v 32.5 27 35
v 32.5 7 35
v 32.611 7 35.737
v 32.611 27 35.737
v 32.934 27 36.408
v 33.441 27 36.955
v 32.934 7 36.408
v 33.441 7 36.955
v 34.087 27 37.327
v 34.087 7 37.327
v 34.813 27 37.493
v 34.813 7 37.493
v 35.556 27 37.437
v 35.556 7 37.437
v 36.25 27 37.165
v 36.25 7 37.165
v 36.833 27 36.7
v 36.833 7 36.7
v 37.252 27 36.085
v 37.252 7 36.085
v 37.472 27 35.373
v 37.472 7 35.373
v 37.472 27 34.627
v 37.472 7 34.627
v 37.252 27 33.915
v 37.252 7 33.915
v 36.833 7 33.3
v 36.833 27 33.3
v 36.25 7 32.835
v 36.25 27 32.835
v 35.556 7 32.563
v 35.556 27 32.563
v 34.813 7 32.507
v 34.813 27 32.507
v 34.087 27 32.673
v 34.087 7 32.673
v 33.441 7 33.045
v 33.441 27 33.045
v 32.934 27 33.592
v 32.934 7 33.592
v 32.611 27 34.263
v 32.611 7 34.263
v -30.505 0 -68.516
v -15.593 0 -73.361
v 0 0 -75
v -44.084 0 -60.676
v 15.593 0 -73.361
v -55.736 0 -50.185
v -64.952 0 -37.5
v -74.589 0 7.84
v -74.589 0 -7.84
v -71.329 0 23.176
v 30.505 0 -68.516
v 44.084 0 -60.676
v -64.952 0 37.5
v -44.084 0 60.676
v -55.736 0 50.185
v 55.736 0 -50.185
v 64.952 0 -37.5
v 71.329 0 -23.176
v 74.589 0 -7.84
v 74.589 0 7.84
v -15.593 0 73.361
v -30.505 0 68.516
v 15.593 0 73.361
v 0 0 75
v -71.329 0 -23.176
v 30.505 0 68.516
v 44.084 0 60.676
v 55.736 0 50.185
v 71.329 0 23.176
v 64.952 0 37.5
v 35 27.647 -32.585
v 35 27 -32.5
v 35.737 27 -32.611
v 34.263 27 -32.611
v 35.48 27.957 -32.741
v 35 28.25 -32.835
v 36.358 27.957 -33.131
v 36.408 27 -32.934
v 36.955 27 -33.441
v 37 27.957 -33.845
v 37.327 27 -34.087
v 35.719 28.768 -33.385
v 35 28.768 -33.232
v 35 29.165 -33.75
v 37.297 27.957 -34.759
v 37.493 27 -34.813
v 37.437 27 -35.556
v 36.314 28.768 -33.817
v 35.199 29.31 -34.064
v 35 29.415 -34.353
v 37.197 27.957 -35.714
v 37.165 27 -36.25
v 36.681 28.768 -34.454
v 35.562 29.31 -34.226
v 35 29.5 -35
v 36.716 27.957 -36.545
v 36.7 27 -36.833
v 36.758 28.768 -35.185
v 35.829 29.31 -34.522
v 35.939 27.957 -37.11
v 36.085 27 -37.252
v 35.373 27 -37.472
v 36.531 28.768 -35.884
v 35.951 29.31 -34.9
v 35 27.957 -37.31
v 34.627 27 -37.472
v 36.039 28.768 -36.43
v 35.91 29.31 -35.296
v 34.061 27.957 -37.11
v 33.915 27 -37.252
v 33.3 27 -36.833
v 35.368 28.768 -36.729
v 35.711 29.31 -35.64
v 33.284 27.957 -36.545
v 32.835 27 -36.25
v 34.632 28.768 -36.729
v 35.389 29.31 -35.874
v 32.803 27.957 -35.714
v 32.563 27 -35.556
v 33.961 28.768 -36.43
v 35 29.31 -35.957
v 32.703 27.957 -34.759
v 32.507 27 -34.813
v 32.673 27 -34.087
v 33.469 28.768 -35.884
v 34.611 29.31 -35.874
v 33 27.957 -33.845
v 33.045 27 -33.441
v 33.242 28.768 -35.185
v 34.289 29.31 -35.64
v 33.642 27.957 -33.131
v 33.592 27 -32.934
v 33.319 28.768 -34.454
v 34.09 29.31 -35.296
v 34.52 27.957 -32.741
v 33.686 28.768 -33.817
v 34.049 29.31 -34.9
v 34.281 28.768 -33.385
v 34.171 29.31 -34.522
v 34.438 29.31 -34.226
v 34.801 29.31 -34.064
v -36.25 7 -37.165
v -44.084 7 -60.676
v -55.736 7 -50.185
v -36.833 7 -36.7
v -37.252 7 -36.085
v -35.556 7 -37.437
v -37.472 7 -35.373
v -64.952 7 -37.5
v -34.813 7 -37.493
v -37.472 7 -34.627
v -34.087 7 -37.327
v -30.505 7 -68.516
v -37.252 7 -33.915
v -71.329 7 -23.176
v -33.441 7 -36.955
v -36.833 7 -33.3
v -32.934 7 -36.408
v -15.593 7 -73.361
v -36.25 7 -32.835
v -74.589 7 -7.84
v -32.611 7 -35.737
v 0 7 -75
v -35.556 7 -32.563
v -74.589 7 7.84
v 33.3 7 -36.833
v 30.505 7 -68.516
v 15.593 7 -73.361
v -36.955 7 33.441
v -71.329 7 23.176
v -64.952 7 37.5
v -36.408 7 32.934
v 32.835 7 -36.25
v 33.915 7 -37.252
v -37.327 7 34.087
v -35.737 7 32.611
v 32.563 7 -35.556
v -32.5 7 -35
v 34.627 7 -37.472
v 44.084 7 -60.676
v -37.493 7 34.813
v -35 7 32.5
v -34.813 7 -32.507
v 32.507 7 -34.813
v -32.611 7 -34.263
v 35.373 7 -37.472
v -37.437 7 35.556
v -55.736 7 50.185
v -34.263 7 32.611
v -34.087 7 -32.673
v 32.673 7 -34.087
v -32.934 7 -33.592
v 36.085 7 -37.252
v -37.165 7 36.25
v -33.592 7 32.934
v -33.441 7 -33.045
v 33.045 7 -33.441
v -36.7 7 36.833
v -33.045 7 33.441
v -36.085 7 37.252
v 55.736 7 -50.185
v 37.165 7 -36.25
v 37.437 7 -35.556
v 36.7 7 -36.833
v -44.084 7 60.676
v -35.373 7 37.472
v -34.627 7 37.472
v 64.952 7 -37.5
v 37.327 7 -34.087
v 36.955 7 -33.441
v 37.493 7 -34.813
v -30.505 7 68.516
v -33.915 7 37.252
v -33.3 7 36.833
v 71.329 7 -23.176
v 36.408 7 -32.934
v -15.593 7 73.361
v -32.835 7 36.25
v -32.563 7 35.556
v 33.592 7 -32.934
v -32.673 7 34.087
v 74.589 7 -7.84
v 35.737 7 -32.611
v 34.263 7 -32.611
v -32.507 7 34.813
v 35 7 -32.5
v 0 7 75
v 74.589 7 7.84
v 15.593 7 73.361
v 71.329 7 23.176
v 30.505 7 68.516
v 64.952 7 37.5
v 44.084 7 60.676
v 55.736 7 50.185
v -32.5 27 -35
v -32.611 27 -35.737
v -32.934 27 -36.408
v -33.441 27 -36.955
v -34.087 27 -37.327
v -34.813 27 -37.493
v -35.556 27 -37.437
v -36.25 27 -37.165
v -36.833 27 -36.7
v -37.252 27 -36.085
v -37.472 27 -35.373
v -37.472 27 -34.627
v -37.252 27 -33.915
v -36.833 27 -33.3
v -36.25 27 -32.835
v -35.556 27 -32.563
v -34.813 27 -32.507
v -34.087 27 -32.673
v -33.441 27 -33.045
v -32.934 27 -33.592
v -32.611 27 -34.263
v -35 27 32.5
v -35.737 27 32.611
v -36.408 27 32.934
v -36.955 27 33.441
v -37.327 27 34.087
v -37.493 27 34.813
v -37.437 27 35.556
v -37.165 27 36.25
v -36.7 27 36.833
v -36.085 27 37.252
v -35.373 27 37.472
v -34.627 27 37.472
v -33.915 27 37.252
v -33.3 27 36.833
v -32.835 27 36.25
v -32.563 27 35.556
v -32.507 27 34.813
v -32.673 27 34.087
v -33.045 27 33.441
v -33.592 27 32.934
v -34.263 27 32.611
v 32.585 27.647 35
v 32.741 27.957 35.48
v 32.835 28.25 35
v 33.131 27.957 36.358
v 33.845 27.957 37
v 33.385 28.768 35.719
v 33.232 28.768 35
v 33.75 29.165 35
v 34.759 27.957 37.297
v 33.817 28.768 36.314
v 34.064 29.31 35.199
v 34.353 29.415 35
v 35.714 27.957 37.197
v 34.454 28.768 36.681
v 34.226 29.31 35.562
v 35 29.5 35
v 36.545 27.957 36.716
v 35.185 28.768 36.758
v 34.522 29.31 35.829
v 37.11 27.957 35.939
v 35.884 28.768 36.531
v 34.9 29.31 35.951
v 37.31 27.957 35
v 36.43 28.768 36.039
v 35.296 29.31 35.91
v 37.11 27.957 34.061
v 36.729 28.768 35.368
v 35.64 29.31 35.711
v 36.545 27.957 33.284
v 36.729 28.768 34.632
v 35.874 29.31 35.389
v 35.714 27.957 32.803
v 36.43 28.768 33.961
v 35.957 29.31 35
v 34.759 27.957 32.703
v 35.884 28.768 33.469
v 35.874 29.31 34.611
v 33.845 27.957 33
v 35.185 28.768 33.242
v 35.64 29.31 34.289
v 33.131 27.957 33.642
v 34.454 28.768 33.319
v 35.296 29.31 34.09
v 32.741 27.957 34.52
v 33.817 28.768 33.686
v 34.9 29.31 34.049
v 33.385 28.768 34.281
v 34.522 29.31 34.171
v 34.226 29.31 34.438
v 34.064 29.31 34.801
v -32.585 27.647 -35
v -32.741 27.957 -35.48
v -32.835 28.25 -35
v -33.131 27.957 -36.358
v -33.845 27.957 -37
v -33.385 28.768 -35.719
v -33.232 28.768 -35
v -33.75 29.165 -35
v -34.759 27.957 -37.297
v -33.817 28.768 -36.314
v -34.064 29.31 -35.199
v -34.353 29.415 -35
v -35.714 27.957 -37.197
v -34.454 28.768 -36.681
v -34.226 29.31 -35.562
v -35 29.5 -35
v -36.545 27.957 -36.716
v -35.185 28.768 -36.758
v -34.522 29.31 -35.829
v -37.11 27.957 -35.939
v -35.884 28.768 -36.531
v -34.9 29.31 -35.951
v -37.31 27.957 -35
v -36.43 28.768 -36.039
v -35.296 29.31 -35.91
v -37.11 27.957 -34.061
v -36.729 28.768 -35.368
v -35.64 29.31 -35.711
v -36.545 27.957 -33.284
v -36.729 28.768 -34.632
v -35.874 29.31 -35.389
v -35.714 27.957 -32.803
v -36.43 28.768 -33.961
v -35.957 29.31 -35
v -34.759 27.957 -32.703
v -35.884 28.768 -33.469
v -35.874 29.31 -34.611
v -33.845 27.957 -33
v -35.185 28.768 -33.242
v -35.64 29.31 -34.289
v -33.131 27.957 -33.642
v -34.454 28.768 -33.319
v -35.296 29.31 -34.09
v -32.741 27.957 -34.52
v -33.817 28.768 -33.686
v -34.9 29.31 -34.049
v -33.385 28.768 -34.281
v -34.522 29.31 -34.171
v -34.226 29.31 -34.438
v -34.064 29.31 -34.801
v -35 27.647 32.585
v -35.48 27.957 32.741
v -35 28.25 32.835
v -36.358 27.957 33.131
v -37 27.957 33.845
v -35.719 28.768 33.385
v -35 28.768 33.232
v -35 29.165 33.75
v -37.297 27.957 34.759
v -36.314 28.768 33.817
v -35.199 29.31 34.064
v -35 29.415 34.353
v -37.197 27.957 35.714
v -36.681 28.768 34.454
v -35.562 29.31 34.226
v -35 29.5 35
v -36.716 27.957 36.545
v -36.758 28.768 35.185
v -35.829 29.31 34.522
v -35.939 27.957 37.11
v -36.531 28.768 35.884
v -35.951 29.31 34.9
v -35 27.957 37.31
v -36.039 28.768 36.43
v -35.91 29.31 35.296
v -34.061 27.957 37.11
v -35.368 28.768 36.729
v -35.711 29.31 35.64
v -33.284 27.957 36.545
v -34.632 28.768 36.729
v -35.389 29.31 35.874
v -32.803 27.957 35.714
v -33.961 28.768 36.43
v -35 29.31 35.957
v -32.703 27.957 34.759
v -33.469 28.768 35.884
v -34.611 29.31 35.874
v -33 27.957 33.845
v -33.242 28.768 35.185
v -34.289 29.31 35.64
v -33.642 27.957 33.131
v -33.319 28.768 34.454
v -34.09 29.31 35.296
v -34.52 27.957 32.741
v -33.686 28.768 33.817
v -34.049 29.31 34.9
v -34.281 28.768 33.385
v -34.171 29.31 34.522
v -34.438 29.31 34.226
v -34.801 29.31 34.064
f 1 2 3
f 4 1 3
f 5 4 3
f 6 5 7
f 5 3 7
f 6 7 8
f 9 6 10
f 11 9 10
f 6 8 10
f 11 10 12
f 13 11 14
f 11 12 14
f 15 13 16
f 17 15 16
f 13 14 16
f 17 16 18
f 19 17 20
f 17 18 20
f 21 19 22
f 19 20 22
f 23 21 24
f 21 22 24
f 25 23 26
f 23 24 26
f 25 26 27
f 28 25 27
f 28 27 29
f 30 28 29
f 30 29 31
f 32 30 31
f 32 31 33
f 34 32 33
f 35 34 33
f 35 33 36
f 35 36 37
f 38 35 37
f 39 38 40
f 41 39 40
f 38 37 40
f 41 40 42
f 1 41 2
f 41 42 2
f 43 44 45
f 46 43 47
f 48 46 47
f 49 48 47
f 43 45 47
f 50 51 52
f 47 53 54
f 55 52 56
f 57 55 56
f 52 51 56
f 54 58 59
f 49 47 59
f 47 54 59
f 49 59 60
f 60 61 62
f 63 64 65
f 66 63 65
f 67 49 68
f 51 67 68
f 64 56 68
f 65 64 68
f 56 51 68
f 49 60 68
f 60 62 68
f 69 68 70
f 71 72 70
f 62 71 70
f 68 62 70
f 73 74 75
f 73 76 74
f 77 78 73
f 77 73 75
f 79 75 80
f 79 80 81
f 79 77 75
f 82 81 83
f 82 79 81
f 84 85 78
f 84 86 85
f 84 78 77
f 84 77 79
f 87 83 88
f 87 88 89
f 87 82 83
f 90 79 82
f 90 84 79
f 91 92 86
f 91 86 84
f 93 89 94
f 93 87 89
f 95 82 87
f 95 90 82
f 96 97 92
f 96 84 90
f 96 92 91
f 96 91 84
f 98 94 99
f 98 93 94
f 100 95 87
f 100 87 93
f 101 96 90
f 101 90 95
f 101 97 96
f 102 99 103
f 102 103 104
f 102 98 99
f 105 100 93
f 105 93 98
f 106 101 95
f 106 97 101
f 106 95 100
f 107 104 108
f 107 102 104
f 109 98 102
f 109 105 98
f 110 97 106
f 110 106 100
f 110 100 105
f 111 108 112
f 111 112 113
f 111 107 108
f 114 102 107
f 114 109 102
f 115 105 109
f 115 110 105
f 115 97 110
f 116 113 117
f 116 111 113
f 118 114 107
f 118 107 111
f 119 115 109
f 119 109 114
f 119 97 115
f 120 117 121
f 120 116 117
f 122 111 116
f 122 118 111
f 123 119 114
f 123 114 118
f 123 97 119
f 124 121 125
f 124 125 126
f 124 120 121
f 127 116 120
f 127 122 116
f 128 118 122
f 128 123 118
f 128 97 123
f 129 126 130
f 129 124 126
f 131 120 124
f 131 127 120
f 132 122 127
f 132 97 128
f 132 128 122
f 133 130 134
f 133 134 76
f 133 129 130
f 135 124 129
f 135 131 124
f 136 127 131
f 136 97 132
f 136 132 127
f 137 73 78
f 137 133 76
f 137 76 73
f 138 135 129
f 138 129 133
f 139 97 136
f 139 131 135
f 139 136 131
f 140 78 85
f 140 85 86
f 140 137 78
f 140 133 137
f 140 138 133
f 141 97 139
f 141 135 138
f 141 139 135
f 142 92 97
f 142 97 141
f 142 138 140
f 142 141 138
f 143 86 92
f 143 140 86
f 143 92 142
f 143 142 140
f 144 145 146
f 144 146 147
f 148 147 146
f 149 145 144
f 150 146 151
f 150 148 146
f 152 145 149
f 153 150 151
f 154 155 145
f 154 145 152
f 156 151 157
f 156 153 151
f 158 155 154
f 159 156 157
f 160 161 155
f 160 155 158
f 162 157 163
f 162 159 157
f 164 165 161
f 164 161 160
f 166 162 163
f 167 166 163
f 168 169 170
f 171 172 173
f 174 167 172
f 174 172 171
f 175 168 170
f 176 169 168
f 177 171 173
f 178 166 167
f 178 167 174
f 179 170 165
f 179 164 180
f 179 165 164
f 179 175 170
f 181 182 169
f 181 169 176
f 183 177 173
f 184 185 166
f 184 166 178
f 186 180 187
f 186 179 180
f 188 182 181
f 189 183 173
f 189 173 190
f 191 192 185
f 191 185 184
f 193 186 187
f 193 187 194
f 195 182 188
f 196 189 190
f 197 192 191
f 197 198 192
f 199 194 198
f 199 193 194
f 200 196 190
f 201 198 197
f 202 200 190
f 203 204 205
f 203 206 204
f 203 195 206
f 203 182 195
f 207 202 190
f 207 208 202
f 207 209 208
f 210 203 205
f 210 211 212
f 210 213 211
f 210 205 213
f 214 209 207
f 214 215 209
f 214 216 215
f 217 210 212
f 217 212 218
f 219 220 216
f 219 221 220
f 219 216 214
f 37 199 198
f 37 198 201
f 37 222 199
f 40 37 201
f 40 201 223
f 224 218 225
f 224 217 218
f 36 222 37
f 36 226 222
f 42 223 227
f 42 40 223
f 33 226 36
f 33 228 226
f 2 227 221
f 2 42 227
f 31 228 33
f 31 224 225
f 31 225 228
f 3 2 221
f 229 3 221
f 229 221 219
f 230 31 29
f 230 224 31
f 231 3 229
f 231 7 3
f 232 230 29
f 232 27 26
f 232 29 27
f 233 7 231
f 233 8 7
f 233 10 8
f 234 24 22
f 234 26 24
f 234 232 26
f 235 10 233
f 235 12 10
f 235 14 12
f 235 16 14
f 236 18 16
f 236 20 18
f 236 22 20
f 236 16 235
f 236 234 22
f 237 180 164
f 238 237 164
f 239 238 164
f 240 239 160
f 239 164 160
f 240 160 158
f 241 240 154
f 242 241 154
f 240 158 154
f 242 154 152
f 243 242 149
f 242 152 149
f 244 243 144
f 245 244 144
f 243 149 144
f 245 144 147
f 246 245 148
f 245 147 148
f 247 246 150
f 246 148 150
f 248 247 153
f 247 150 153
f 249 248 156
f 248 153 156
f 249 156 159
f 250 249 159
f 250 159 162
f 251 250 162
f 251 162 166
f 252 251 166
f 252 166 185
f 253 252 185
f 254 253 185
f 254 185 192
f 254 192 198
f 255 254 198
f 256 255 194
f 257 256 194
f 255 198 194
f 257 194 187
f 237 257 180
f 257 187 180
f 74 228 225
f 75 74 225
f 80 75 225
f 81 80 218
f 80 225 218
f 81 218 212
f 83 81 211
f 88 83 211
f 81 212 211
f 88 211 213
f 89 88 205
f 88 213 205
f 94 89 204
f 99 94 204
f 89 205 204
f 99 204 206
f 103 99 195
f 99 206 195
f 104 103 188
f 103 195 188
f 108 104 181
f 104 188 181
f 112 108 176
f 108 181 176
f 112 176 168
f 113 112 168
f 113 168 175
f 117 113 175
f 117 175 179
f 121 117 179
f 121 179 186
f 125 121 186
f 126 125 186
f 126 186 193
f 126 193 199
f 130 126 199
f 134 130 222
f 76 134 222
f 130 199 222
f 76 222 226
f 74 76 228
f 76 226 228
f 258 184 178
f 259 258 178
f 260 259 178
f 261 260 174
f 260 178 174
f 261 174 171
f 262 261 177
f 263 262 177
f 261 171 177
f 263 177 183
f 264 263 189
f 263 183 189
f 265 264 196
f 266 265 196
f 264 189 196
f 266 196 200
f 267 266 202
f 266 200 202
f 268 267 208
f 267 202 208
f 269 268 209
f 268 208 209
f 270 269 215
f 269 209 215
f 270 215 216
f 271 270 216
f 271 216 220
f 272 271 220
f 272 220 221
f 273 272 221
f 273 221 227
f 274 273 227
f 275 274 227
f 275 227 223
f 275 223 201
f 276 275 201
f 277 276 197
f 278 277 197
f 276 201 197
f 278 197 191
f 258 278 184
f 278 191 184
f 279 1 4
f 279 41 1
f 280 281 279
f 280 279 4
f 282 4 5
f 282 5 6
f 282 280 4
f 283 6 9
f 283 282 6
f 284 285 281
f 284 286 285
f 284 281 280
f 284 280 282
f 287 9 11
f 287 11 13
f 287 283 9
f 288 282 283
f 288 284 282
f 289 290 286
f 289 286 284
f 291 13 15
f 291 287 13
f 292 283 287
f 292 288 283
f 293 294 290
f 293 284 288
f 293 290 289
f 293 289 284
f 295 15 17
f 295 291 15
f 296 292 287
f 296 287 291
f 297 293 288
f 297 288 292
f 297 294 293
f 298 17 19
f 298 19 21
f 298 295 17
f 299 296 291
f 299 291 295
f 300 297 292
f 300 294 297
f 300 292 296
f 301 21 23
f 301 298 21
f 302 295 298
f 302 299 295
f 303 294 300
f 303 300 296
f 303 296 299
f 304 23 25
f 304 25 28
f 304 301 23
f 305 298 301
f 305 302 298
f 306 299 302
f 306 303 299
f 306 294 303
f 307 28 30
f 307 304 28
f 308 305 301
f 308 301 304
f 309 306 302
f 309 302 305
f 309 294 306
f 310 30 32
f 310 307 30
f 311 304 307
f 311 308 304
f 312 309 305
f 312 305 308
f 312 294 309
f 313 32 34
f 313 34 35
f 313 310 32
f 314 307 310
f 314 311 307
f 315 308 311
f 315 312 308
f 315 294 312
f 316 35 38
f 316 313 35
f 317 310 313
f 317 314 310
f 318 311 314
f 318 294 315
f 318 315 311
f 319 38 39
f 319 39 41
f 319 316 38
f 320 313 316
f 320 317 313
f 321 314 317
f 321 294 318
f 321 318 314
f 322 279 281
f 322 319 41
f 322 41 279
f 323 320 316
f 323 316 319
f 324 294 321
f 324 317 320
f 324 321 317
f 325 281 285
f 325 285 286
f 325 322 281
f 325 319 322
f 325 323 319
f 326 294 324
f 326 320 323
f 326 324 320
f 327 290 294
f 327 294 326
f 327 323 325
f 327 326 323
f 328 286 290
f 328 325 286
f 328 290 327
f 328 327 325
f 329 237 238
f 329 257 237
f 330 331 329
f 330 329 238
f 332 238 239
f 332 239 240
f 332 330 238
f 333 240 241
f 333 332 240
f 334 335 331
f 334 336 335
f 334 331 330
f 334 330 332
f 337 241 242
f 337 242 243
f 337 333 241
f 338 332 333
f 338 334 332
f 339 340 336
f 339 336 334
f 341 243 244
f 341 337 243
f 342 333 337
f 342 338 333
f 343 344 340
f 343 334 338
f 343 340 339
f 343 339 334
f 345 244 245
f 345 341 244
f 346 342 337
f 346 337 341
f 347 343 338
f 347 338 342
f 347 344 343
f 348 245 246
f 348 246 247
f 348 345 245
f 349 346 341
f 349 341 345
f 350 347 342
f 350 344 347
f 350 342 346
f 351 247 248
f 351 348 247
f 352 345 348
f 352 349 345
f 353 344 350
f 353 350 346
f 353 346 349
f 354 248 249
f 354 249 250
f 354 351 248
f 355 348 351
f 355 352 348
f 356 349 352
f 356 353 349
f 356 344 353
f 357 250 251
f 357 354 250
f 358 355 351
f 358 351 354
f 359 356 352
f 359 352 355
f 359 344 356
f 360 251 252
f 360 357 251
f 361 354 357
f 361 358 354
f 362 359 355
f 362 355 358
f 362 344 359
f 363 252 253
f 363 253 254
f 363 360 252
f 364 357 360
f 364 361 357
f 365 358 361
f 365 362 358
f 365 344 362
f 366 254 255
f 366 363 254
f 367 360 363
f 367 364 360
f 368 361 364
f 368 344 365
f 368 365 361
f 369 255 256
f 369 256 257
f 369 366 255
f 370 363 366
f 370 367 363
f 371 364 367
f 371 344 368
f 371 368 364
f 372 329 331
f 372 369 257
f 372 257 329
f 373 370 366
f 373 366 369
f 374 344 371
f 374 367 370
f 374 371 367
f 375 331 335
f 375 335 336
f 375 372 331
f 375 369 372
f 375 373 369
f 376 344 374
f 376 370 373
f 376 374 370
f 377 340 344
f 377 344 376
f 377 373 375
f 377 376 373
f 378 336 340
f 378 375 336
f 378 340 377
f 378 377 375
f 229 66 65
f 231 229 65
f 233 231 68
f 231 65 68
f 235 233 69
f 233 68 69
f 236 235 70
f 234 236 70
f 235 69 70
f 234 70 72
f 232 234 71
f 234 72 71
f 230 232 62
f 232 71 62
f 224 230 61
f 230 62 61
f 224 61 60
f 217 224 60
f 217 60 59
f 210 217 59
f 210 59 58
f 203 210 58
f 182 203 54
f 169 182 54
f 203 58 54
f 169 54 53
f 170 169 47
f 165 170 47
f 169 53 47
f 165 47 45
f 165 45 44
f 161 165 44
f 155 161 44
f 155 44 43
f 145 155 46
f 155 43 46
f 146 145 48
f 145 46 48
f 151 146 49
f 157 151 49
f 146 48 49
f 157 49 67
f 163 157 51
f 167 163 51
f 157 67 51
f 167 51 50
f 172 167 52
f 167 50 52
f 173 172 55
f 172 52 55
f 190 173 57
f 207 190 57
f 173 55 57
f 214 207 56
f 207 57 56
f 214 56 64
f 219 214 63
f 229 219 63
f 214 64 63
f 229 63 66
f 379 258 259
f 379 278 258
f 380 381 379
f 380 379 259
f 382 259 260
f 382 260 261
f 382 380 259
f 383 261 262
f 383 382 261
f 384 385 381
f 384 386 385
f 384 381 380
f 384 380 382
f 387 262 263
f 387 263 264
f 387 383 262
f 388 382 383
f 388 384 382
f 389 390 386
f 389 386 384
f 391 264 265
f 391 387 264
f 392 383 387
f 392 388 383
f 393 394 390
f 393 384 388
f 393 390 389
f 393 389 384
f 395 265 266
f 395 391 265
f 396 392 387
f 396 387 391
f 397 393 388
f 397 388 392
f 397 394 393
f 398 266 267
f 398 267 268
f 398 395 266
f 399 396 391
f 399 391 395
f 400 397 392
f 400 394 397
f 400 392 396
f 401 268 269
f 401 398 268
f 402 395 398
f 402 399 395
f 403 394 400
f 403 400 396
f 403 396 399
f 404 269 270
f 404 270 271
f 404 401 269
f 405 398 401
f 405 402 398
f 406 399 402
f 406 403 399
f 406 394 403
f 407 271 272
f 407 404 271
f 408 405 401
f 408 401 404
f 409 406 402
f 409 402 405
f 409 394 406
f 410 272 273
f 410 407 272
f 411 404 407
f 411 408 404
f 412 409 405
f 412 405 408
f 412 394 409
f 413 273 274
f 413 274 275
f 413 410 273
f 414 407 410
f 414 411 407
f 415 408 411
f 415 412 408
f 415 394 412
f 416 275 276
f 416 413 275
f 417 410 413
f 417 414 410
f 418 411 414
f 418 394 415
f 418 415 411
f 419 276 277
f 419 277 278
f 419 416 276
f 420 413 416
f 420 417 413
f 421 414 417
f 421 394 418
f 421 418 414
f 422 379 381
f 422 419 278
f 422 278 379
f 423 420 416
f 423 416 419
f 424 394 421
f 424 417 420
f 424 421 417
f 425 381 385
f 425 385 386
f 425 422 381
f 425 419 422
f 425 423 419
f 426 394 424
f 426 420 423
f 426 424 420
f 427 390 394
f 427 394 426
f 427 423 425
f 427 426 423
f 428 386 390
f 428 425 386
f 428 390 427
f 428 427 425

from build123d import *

# Parameters (mm, degrees)
SKETCH1_R           = 75
BOSS_EXTRUDE1_DEPTH = 7
SKETCH2_R           = 2.5
BOSS_EXTRUDE2_DEPTH = 20
CIRPATTERN1_COUNT   = 4
CIRPATTERN3_COUNT   = 4


# Read off the part's stored shape, not the designer's step: Dome1
with BuildPart() as part:
    # Sketch1 → Boss-Extrude1 (new body)
    with BuildSketch(Plane(origin=(0, 0, 0), x_dir=(1, 0, 0), z_dir=(0, 1, 0))):
        with Locations(Location((0, 0, 0), (0, 0, 270))):
            Circle(SKETCH1_R)
    extrude(amount=BOSS_EXTRUDE1_DEPTH)

    # Sketch2 → Boss-Extrude2 (add)
    with BuildSketch(Plane(origin=(0, 7, 0), x_dir=(1, 0, 0), z_dir=(0, 1, 0))):
        with Locations(Location((35, 35, 0), (0, 0, 270))):
            Circle(SKETCH2_R)
    boss_extrude2 = extrude(amount=BOSS_EXTRUDE2_DEPTH)

    # CirPattern1: Boss-Extrude2 ×4 about axis
    cirpattern1_axis = Axis((0, 0, 0), (0, 1, 0))
    for i in range(1, CIRPATTERN1_COUNT):
        add(boss_extrude2.rotate(cirpattern1_axis, i * 360 / CIRPATTERN1_COUNT))

    # Dome1 outline → Dome1 (revolve)
    with BuildSketch(Plane(origin=(-35, 0, -35), x_dir=(1, 0, 0), z_dir=(0, 0, 1))):
        with BuildLine():
            Line((0, 27), (2.5, 26.999999997))
            ThreePointArc((2.5, 26.999999997), (1.767766954, 28.767766952), (0, 29.5))
            Line((0, 29.5), (0, 27))
        make_face()
    dome1 = revolve(axis=Axis((-35, 0, -35), (0, 1, 0)))

    # CirPattern3: Dome1 ×4 about axis
    cirpattern3_axis = Axis((0, 0, 0), (0, 1, 0))
    for i in range(1, CIRPATTERN3_COUNT):
        add(dome1.rotate(cirpattern3_axis, i * 360 / CIRPATTERN3_COUNT))


solid = part.part
